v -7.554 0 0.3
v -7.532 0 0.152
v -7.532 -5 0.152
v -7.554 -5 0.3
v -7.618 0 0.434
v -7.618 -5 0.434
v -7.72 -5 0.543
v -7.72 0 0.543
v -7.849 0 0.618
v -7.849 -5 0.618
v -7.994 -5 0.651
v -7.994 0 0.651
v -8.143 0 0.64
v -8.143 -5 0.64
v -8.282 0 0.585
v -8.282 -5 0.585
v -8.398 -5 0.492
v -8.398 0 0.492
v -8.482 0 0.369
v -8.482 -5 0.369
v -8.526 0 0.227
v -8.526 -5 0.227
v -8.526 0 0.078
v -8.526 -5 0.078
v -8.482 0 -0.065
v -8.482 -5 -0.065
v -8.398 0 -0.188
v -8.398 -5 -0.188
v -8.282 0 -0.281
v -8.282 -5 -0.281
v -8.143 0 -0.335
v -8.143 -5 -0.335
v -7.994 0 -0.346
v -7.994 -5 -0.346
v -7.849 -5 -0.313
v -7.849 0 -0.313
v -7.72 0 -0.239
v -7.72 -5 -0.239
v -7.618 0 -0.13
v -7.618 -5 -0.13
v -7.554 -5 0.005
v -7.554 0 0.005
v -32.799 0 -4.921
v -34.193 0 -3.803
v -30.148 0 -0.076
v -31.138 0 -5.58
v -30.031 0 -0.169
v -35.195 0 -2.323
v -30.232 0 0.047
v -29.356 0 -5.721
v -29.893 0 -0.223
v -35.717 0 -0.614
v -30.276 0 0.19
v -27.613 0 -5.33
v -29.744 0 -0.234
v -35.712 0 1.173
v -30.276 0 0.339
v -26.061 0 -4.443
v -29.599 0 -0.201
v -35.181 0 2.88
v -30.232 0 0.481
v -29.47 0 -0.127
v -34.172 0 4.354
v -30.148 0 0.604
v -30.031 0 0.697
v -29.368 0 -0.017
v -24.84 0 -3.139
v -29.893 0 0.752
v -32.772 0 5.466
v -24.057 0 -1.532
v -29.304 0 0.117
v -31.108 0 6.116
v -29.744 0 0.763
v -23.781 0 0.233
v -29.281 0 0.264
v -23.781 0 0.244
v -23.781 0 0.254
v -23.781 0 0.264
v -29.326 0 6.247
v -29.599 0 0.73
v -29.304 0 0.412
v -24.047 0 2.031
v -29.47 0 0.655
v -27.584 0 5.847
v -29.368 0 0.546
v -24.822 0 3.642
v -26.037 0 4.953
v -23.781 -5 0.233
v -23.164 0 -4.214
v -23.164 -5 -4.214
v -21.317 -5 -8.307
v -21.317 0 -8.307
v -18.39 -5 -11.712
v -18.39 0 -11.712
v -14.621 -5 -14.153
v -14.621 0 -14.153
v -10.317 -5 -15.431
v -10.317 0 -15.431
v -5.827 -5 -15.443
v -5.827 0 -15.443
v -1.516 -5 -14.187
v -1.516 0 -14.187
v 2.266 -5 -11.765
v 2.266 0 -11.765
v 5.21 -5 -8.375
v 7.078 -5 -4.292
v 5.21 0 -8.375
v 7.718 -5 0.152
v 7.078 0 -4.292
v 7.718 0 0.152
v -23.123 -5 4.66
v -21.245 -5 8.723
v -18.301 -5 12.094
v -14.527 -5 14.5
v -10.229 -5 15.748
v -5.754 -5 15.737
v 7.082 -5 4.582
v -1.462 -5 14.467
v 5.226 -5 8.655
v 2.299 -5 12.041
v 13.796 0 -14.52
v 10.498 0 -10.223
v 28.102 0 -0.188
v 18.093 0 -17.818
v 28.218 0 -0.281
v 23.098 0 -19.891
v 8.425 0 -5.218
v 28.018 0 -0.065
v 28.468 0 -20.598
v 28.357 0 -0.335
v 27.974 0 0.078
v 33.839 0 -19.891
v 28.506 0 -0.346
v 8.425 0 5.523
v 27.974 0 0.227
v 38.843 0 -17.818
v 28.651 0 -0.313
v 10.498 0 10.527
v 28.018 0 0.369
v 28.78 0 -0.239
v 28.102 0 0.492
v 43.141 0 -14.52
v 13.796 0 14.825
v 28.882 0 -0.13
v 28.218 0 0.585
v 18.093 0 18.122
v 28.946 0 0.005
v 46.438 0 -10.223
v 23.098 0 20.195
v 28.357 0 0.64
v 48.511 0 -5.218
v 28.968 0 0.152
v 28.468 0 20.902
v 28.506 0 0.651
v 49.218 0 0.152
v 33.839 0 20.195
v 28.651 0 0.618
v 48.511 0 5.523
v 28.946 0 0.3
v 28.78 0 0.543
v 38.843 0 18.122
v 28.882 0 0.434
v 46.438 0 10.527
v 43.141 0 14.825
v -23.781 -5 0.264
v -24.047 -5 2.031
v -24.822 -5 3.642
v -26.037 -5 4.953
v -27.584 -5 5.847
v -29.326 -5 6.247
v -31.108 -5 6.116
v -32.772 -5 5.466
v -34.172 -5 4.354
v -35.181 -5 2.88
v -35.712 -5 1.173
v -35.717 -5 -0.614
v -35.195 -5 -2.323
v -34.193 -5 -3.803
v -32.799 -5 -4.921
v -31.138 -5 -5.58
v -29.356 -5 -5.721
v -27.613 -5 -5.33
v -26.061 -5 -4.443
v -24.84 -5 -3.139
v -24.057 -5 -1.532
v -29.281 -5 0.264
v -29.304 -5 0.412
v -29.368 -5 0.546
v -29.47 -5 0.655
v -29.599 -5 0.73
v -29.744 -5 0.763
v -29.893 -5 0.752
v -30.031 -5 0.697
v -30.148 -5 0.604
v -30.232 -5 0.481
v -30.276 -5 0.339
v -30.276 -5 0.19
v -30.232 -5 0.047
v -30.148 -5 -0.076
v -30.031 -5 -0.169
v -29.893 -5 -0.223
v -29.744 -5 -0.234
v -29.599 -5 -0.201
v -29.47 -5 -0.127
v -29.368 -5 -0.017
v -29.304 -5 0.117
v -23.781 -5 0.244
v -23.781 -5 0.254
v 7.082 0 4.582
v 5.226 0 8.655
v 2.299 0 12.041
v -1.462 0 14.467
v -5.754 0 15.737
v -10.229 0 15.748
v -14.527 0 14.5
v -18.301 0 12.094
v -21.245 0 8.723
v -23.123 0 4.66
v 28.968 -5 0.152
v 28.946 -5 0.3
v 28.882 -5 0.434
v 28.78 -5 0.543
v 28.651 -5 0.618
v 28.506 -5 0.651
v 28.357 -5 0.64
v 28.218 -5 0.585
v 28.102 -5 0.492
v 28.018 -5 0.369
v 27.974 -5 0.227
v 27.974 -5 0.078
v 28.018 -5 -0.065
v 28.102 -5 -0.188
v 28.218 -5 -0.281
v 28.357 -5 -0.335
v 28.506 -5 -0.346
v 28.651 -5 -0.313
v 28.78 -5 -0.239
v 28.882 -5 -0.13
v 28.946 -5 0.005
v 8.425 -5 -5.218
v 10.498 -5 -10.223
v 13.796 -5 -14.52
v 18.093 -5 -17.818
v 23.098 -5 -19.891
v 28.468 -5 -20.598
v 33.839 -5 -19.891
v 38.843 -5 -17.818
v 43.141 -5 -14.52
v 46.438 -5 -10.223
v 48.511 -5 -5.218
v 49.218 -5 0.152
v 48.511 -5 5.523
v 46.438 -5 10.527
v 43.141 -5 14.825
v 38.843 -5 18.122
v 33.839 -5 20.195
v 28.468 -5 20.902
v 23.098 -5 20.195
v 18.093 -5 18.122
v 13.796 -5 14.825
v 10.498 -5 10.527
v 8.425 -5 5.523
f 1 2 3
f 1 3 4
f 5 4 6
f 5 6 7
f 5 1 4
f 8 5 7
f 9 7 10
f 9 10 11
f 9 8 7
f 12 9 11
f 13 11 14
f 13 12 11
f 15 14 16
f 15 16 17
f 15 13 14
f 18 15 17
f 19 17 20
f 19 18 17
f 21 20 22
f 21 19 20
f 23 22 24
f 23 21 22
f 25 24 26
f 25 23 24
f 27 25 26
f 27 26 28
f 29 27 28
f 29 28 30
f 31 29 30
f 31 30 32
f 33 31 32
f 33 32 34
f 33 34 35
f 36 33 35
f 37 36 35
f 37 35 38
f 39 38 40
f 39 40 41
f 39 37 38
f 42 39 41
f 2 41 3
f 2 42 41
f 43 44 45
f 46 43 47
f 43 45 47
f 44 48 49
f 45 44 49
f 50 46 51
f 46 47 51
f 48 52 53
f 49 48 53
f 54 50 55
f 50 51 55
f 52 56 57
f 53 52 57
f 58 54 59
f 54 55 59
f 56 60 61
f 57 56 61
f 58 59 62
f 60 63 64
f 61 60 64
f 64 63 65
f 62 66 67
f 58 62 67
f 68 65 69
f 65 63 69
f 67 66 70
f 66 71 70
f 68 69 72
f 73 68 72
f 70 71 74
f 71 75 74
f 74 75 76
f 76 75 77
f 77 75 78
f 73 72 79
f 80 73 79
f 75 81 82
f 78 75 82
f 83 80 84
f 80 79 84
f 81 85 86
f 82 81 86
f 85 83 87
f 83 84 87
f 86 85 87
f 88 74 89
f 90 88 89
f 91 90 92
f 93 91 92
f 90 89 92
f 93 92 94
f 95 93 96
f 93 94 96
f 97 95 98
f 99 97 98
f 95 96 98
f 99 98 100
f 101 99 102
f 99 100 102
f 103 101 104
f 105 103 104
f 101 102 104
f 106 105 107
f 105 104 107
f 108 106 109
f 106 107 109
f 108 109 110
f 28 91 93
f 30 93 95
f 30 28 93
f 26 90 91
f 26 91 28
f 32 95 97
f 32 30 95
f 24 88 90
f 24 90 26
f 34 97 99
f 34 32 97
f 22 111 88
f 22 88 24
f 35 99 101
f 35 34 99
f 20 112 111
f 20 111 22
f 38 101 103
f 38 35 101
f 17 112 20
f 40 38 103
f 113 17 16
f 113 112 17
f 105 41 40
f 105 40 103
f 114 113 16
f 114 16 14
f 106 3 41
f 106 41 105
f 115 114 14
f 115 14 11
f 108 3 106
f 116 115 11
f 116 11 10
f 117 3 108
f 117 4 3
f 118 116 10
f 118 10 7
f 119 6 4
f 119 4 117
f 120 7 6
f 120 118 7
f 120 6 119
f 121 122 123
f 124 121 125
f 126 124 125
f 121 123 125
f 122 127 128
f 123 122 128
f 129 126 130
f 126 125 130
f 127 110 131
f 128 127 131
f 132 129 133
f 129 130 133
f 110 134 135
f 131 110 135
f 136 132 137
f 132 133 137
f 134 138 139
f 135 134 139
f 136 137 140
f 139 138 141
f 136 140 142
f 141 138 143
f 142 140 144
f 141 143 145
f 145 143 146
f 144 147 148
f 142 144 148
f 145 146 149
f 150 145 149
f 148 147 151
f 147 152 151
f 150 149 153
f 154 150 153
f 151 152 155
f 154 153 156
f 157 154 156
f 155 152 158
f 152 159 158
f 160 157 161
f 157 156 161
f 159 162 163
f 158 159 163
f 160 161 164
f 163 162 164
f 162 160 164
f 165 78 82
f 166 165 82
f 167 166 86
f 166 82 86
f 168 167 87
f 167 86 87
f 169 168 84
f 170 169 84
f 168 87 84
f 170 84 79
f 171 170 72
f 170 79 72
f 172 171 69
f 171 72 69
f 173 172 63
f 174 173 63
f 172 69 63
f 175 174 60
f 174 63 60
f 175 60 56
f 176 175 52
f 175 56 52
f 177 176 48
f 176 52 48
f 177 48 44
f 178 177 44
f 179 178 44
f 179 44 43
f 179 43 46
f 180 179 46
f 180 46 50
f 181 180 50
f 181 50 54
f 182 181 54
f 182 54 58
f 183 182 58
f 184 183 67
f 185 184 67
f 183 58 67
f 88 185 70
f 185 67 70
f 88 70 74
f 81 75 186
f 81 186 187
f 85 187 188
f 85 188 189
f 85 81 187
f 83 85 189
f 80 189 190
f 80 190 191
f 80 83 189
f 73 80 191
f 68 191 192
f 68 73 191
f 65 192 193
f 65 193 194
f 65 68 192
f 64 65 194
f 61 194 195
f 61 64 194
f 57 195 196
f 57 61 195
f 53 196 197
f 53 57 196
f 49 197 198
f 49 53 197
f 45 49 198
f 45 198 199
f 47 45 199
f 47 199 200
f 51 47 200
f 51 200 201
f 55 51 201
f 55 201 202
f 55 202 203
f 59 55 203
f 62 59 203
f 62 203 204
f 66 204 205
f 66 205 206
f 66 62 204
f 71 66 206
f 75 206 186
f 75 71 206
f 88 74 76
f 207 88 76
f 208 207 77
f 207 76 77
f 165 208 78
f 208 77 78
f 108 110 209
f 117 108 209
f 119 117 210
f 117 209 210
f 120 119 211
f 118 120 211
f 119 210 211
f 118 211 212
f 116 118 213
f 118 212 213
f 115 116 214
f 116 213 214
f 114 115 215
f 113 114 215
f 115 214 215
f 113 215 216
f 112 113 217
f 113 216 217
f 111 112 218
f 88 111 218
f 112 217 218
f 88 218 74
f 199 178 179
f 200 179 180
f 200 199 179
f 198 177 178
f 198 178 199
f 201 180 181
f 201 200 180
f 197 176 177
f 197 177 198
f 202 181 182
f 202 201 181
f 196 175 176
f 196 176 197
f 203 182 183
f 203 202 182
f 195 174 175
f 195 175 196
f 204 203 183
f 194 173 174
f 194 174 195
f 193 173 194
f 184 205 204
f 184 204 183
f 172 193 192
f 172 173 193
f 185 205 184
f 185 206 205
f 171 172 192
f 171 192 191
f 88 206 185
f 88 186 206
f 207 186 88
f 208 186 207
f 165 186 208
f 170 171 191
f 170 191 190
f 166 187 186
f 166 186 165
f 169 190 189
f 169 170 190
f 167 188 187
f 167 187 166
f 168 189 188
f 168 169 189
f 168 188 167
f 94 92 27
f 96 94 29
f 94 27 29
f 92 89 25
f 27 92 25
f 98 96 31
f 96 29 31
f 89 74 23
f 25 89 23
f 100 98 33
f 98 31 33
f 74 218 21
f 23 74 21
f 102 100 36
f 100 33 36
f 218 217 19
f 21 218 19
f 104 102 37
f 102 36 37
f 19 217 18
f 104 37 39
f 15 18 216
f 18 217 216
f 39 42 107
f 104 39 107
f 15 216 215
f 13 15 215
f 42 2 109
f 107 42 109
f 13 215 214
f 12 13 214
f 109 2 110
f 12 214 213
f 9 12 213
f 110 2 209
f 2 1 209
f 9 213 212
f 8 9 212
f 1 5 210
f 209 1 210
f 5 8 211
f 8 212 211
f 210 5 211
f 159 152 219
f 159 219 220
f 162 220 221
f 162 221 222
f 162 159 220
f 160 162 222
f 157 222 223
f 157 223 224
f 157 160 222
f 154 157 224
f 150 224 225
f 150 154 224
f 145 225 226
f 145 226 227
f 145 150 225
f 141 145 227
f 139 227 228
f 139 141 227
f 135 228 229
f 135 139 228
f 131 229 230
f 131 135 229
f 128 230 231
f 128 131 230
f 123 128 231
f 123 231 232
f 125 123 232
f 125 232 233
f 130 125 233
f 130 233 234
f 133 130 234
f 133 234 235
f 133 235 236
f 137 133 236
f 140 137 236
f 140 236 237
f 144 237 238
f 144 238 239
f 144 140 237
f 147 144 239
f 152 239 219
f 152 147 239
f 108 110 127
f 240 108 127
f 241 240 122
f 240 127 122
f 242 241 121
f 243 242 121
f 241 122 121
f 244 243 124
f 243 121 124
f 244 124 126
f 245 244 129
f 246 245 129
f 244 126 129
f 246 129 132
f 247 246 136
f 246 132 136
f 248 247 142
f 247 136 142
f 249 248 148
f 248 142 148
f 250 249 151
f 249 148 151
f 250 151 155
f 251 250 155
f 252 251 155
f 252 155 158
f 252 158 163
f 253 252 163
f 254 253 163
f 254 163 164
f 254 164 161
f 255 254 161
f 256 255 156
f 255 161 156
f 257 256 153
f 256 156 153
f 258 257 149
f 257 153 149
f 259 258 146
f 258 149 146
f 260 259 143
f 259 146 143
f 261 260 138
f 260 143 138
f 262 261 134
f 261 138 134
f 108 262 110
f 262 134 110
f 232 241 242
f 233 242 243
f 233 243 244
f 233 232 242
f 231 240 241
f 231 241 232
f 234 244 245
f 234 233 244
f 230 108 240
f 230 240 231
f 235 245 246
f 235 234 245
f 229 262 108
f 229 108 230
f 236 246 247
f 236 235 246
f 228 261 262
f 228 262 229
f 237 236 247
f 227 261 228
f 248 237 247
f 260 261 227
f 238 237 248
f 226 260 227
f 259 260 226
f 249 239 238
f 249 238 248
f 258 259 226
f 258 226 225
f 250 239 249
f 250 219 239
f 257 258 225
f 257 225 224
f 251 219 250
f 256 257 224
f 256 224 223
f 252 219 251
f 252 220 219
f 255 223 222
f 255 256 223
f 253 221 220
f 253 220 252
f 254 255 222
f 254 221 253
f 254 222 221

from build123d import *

# Parameters (mm, degrees)
F0_R     = 0.5
F1_DEPTH = 5
F2_DEPTH = 5
F3_DEPTH = 5


with BuildPart() as f1:
    # F0 (on Front) → F1 (new body)
    with BuildSketch(Plane.XZ):
        with BuildLine():
            ThreePointArc((-23.781403, 0.233414), (-23.781343, 0.248895), (-23.781323, 0.264375))
            ThreePointArc((-23.781323, 0.264375), (-35.781303, 0.279856), (-23.781403, 0.233414))
        make_face()
        with Locations((-29.781323, 0.264375)):
            Circle(F0_R, mode=Mode.SUBTRACT)
    extrude(amount=F1_DEPTH)

    # F0 (on Front) → F2 (join)
    with BuildSketch(Plane.XZ):
        with BuildLine():
            ThreePointArc((7.718387, 0.152142), (-7.990976, 15.90209), (-23.781403, 0.233414))
            ThreePointArc((-23.781403, 0.233414), (-8.072249, -15.597805), (7.718387, 0.152142))
        make_face()
        with Locations((-8.031613, 0.152142)):
            Circle(F0_R, mode=Mode.SUBTRACT)
    extrude(amount=F2_DEPTH)

    # F0 (on Front) → F3 (join)
    with BuildSketch(Plane.XZ):
        with BuildLine():
            ThreePointArc((49.218387, 0.152142), (28.468387, 20.902142), (7.718387, 0.152142))
            ThreePointArc((7.718387, 0.152142), (28.468387, -20.597858), (49.218387, 0.152142))
        make_face()
        with Locations((28.468387, 0.152142)):
            Circle(F0_R, mode=Mode.SUBTRACT)
    extrude(amount=F3_DEPTH)


solid = f1.part
